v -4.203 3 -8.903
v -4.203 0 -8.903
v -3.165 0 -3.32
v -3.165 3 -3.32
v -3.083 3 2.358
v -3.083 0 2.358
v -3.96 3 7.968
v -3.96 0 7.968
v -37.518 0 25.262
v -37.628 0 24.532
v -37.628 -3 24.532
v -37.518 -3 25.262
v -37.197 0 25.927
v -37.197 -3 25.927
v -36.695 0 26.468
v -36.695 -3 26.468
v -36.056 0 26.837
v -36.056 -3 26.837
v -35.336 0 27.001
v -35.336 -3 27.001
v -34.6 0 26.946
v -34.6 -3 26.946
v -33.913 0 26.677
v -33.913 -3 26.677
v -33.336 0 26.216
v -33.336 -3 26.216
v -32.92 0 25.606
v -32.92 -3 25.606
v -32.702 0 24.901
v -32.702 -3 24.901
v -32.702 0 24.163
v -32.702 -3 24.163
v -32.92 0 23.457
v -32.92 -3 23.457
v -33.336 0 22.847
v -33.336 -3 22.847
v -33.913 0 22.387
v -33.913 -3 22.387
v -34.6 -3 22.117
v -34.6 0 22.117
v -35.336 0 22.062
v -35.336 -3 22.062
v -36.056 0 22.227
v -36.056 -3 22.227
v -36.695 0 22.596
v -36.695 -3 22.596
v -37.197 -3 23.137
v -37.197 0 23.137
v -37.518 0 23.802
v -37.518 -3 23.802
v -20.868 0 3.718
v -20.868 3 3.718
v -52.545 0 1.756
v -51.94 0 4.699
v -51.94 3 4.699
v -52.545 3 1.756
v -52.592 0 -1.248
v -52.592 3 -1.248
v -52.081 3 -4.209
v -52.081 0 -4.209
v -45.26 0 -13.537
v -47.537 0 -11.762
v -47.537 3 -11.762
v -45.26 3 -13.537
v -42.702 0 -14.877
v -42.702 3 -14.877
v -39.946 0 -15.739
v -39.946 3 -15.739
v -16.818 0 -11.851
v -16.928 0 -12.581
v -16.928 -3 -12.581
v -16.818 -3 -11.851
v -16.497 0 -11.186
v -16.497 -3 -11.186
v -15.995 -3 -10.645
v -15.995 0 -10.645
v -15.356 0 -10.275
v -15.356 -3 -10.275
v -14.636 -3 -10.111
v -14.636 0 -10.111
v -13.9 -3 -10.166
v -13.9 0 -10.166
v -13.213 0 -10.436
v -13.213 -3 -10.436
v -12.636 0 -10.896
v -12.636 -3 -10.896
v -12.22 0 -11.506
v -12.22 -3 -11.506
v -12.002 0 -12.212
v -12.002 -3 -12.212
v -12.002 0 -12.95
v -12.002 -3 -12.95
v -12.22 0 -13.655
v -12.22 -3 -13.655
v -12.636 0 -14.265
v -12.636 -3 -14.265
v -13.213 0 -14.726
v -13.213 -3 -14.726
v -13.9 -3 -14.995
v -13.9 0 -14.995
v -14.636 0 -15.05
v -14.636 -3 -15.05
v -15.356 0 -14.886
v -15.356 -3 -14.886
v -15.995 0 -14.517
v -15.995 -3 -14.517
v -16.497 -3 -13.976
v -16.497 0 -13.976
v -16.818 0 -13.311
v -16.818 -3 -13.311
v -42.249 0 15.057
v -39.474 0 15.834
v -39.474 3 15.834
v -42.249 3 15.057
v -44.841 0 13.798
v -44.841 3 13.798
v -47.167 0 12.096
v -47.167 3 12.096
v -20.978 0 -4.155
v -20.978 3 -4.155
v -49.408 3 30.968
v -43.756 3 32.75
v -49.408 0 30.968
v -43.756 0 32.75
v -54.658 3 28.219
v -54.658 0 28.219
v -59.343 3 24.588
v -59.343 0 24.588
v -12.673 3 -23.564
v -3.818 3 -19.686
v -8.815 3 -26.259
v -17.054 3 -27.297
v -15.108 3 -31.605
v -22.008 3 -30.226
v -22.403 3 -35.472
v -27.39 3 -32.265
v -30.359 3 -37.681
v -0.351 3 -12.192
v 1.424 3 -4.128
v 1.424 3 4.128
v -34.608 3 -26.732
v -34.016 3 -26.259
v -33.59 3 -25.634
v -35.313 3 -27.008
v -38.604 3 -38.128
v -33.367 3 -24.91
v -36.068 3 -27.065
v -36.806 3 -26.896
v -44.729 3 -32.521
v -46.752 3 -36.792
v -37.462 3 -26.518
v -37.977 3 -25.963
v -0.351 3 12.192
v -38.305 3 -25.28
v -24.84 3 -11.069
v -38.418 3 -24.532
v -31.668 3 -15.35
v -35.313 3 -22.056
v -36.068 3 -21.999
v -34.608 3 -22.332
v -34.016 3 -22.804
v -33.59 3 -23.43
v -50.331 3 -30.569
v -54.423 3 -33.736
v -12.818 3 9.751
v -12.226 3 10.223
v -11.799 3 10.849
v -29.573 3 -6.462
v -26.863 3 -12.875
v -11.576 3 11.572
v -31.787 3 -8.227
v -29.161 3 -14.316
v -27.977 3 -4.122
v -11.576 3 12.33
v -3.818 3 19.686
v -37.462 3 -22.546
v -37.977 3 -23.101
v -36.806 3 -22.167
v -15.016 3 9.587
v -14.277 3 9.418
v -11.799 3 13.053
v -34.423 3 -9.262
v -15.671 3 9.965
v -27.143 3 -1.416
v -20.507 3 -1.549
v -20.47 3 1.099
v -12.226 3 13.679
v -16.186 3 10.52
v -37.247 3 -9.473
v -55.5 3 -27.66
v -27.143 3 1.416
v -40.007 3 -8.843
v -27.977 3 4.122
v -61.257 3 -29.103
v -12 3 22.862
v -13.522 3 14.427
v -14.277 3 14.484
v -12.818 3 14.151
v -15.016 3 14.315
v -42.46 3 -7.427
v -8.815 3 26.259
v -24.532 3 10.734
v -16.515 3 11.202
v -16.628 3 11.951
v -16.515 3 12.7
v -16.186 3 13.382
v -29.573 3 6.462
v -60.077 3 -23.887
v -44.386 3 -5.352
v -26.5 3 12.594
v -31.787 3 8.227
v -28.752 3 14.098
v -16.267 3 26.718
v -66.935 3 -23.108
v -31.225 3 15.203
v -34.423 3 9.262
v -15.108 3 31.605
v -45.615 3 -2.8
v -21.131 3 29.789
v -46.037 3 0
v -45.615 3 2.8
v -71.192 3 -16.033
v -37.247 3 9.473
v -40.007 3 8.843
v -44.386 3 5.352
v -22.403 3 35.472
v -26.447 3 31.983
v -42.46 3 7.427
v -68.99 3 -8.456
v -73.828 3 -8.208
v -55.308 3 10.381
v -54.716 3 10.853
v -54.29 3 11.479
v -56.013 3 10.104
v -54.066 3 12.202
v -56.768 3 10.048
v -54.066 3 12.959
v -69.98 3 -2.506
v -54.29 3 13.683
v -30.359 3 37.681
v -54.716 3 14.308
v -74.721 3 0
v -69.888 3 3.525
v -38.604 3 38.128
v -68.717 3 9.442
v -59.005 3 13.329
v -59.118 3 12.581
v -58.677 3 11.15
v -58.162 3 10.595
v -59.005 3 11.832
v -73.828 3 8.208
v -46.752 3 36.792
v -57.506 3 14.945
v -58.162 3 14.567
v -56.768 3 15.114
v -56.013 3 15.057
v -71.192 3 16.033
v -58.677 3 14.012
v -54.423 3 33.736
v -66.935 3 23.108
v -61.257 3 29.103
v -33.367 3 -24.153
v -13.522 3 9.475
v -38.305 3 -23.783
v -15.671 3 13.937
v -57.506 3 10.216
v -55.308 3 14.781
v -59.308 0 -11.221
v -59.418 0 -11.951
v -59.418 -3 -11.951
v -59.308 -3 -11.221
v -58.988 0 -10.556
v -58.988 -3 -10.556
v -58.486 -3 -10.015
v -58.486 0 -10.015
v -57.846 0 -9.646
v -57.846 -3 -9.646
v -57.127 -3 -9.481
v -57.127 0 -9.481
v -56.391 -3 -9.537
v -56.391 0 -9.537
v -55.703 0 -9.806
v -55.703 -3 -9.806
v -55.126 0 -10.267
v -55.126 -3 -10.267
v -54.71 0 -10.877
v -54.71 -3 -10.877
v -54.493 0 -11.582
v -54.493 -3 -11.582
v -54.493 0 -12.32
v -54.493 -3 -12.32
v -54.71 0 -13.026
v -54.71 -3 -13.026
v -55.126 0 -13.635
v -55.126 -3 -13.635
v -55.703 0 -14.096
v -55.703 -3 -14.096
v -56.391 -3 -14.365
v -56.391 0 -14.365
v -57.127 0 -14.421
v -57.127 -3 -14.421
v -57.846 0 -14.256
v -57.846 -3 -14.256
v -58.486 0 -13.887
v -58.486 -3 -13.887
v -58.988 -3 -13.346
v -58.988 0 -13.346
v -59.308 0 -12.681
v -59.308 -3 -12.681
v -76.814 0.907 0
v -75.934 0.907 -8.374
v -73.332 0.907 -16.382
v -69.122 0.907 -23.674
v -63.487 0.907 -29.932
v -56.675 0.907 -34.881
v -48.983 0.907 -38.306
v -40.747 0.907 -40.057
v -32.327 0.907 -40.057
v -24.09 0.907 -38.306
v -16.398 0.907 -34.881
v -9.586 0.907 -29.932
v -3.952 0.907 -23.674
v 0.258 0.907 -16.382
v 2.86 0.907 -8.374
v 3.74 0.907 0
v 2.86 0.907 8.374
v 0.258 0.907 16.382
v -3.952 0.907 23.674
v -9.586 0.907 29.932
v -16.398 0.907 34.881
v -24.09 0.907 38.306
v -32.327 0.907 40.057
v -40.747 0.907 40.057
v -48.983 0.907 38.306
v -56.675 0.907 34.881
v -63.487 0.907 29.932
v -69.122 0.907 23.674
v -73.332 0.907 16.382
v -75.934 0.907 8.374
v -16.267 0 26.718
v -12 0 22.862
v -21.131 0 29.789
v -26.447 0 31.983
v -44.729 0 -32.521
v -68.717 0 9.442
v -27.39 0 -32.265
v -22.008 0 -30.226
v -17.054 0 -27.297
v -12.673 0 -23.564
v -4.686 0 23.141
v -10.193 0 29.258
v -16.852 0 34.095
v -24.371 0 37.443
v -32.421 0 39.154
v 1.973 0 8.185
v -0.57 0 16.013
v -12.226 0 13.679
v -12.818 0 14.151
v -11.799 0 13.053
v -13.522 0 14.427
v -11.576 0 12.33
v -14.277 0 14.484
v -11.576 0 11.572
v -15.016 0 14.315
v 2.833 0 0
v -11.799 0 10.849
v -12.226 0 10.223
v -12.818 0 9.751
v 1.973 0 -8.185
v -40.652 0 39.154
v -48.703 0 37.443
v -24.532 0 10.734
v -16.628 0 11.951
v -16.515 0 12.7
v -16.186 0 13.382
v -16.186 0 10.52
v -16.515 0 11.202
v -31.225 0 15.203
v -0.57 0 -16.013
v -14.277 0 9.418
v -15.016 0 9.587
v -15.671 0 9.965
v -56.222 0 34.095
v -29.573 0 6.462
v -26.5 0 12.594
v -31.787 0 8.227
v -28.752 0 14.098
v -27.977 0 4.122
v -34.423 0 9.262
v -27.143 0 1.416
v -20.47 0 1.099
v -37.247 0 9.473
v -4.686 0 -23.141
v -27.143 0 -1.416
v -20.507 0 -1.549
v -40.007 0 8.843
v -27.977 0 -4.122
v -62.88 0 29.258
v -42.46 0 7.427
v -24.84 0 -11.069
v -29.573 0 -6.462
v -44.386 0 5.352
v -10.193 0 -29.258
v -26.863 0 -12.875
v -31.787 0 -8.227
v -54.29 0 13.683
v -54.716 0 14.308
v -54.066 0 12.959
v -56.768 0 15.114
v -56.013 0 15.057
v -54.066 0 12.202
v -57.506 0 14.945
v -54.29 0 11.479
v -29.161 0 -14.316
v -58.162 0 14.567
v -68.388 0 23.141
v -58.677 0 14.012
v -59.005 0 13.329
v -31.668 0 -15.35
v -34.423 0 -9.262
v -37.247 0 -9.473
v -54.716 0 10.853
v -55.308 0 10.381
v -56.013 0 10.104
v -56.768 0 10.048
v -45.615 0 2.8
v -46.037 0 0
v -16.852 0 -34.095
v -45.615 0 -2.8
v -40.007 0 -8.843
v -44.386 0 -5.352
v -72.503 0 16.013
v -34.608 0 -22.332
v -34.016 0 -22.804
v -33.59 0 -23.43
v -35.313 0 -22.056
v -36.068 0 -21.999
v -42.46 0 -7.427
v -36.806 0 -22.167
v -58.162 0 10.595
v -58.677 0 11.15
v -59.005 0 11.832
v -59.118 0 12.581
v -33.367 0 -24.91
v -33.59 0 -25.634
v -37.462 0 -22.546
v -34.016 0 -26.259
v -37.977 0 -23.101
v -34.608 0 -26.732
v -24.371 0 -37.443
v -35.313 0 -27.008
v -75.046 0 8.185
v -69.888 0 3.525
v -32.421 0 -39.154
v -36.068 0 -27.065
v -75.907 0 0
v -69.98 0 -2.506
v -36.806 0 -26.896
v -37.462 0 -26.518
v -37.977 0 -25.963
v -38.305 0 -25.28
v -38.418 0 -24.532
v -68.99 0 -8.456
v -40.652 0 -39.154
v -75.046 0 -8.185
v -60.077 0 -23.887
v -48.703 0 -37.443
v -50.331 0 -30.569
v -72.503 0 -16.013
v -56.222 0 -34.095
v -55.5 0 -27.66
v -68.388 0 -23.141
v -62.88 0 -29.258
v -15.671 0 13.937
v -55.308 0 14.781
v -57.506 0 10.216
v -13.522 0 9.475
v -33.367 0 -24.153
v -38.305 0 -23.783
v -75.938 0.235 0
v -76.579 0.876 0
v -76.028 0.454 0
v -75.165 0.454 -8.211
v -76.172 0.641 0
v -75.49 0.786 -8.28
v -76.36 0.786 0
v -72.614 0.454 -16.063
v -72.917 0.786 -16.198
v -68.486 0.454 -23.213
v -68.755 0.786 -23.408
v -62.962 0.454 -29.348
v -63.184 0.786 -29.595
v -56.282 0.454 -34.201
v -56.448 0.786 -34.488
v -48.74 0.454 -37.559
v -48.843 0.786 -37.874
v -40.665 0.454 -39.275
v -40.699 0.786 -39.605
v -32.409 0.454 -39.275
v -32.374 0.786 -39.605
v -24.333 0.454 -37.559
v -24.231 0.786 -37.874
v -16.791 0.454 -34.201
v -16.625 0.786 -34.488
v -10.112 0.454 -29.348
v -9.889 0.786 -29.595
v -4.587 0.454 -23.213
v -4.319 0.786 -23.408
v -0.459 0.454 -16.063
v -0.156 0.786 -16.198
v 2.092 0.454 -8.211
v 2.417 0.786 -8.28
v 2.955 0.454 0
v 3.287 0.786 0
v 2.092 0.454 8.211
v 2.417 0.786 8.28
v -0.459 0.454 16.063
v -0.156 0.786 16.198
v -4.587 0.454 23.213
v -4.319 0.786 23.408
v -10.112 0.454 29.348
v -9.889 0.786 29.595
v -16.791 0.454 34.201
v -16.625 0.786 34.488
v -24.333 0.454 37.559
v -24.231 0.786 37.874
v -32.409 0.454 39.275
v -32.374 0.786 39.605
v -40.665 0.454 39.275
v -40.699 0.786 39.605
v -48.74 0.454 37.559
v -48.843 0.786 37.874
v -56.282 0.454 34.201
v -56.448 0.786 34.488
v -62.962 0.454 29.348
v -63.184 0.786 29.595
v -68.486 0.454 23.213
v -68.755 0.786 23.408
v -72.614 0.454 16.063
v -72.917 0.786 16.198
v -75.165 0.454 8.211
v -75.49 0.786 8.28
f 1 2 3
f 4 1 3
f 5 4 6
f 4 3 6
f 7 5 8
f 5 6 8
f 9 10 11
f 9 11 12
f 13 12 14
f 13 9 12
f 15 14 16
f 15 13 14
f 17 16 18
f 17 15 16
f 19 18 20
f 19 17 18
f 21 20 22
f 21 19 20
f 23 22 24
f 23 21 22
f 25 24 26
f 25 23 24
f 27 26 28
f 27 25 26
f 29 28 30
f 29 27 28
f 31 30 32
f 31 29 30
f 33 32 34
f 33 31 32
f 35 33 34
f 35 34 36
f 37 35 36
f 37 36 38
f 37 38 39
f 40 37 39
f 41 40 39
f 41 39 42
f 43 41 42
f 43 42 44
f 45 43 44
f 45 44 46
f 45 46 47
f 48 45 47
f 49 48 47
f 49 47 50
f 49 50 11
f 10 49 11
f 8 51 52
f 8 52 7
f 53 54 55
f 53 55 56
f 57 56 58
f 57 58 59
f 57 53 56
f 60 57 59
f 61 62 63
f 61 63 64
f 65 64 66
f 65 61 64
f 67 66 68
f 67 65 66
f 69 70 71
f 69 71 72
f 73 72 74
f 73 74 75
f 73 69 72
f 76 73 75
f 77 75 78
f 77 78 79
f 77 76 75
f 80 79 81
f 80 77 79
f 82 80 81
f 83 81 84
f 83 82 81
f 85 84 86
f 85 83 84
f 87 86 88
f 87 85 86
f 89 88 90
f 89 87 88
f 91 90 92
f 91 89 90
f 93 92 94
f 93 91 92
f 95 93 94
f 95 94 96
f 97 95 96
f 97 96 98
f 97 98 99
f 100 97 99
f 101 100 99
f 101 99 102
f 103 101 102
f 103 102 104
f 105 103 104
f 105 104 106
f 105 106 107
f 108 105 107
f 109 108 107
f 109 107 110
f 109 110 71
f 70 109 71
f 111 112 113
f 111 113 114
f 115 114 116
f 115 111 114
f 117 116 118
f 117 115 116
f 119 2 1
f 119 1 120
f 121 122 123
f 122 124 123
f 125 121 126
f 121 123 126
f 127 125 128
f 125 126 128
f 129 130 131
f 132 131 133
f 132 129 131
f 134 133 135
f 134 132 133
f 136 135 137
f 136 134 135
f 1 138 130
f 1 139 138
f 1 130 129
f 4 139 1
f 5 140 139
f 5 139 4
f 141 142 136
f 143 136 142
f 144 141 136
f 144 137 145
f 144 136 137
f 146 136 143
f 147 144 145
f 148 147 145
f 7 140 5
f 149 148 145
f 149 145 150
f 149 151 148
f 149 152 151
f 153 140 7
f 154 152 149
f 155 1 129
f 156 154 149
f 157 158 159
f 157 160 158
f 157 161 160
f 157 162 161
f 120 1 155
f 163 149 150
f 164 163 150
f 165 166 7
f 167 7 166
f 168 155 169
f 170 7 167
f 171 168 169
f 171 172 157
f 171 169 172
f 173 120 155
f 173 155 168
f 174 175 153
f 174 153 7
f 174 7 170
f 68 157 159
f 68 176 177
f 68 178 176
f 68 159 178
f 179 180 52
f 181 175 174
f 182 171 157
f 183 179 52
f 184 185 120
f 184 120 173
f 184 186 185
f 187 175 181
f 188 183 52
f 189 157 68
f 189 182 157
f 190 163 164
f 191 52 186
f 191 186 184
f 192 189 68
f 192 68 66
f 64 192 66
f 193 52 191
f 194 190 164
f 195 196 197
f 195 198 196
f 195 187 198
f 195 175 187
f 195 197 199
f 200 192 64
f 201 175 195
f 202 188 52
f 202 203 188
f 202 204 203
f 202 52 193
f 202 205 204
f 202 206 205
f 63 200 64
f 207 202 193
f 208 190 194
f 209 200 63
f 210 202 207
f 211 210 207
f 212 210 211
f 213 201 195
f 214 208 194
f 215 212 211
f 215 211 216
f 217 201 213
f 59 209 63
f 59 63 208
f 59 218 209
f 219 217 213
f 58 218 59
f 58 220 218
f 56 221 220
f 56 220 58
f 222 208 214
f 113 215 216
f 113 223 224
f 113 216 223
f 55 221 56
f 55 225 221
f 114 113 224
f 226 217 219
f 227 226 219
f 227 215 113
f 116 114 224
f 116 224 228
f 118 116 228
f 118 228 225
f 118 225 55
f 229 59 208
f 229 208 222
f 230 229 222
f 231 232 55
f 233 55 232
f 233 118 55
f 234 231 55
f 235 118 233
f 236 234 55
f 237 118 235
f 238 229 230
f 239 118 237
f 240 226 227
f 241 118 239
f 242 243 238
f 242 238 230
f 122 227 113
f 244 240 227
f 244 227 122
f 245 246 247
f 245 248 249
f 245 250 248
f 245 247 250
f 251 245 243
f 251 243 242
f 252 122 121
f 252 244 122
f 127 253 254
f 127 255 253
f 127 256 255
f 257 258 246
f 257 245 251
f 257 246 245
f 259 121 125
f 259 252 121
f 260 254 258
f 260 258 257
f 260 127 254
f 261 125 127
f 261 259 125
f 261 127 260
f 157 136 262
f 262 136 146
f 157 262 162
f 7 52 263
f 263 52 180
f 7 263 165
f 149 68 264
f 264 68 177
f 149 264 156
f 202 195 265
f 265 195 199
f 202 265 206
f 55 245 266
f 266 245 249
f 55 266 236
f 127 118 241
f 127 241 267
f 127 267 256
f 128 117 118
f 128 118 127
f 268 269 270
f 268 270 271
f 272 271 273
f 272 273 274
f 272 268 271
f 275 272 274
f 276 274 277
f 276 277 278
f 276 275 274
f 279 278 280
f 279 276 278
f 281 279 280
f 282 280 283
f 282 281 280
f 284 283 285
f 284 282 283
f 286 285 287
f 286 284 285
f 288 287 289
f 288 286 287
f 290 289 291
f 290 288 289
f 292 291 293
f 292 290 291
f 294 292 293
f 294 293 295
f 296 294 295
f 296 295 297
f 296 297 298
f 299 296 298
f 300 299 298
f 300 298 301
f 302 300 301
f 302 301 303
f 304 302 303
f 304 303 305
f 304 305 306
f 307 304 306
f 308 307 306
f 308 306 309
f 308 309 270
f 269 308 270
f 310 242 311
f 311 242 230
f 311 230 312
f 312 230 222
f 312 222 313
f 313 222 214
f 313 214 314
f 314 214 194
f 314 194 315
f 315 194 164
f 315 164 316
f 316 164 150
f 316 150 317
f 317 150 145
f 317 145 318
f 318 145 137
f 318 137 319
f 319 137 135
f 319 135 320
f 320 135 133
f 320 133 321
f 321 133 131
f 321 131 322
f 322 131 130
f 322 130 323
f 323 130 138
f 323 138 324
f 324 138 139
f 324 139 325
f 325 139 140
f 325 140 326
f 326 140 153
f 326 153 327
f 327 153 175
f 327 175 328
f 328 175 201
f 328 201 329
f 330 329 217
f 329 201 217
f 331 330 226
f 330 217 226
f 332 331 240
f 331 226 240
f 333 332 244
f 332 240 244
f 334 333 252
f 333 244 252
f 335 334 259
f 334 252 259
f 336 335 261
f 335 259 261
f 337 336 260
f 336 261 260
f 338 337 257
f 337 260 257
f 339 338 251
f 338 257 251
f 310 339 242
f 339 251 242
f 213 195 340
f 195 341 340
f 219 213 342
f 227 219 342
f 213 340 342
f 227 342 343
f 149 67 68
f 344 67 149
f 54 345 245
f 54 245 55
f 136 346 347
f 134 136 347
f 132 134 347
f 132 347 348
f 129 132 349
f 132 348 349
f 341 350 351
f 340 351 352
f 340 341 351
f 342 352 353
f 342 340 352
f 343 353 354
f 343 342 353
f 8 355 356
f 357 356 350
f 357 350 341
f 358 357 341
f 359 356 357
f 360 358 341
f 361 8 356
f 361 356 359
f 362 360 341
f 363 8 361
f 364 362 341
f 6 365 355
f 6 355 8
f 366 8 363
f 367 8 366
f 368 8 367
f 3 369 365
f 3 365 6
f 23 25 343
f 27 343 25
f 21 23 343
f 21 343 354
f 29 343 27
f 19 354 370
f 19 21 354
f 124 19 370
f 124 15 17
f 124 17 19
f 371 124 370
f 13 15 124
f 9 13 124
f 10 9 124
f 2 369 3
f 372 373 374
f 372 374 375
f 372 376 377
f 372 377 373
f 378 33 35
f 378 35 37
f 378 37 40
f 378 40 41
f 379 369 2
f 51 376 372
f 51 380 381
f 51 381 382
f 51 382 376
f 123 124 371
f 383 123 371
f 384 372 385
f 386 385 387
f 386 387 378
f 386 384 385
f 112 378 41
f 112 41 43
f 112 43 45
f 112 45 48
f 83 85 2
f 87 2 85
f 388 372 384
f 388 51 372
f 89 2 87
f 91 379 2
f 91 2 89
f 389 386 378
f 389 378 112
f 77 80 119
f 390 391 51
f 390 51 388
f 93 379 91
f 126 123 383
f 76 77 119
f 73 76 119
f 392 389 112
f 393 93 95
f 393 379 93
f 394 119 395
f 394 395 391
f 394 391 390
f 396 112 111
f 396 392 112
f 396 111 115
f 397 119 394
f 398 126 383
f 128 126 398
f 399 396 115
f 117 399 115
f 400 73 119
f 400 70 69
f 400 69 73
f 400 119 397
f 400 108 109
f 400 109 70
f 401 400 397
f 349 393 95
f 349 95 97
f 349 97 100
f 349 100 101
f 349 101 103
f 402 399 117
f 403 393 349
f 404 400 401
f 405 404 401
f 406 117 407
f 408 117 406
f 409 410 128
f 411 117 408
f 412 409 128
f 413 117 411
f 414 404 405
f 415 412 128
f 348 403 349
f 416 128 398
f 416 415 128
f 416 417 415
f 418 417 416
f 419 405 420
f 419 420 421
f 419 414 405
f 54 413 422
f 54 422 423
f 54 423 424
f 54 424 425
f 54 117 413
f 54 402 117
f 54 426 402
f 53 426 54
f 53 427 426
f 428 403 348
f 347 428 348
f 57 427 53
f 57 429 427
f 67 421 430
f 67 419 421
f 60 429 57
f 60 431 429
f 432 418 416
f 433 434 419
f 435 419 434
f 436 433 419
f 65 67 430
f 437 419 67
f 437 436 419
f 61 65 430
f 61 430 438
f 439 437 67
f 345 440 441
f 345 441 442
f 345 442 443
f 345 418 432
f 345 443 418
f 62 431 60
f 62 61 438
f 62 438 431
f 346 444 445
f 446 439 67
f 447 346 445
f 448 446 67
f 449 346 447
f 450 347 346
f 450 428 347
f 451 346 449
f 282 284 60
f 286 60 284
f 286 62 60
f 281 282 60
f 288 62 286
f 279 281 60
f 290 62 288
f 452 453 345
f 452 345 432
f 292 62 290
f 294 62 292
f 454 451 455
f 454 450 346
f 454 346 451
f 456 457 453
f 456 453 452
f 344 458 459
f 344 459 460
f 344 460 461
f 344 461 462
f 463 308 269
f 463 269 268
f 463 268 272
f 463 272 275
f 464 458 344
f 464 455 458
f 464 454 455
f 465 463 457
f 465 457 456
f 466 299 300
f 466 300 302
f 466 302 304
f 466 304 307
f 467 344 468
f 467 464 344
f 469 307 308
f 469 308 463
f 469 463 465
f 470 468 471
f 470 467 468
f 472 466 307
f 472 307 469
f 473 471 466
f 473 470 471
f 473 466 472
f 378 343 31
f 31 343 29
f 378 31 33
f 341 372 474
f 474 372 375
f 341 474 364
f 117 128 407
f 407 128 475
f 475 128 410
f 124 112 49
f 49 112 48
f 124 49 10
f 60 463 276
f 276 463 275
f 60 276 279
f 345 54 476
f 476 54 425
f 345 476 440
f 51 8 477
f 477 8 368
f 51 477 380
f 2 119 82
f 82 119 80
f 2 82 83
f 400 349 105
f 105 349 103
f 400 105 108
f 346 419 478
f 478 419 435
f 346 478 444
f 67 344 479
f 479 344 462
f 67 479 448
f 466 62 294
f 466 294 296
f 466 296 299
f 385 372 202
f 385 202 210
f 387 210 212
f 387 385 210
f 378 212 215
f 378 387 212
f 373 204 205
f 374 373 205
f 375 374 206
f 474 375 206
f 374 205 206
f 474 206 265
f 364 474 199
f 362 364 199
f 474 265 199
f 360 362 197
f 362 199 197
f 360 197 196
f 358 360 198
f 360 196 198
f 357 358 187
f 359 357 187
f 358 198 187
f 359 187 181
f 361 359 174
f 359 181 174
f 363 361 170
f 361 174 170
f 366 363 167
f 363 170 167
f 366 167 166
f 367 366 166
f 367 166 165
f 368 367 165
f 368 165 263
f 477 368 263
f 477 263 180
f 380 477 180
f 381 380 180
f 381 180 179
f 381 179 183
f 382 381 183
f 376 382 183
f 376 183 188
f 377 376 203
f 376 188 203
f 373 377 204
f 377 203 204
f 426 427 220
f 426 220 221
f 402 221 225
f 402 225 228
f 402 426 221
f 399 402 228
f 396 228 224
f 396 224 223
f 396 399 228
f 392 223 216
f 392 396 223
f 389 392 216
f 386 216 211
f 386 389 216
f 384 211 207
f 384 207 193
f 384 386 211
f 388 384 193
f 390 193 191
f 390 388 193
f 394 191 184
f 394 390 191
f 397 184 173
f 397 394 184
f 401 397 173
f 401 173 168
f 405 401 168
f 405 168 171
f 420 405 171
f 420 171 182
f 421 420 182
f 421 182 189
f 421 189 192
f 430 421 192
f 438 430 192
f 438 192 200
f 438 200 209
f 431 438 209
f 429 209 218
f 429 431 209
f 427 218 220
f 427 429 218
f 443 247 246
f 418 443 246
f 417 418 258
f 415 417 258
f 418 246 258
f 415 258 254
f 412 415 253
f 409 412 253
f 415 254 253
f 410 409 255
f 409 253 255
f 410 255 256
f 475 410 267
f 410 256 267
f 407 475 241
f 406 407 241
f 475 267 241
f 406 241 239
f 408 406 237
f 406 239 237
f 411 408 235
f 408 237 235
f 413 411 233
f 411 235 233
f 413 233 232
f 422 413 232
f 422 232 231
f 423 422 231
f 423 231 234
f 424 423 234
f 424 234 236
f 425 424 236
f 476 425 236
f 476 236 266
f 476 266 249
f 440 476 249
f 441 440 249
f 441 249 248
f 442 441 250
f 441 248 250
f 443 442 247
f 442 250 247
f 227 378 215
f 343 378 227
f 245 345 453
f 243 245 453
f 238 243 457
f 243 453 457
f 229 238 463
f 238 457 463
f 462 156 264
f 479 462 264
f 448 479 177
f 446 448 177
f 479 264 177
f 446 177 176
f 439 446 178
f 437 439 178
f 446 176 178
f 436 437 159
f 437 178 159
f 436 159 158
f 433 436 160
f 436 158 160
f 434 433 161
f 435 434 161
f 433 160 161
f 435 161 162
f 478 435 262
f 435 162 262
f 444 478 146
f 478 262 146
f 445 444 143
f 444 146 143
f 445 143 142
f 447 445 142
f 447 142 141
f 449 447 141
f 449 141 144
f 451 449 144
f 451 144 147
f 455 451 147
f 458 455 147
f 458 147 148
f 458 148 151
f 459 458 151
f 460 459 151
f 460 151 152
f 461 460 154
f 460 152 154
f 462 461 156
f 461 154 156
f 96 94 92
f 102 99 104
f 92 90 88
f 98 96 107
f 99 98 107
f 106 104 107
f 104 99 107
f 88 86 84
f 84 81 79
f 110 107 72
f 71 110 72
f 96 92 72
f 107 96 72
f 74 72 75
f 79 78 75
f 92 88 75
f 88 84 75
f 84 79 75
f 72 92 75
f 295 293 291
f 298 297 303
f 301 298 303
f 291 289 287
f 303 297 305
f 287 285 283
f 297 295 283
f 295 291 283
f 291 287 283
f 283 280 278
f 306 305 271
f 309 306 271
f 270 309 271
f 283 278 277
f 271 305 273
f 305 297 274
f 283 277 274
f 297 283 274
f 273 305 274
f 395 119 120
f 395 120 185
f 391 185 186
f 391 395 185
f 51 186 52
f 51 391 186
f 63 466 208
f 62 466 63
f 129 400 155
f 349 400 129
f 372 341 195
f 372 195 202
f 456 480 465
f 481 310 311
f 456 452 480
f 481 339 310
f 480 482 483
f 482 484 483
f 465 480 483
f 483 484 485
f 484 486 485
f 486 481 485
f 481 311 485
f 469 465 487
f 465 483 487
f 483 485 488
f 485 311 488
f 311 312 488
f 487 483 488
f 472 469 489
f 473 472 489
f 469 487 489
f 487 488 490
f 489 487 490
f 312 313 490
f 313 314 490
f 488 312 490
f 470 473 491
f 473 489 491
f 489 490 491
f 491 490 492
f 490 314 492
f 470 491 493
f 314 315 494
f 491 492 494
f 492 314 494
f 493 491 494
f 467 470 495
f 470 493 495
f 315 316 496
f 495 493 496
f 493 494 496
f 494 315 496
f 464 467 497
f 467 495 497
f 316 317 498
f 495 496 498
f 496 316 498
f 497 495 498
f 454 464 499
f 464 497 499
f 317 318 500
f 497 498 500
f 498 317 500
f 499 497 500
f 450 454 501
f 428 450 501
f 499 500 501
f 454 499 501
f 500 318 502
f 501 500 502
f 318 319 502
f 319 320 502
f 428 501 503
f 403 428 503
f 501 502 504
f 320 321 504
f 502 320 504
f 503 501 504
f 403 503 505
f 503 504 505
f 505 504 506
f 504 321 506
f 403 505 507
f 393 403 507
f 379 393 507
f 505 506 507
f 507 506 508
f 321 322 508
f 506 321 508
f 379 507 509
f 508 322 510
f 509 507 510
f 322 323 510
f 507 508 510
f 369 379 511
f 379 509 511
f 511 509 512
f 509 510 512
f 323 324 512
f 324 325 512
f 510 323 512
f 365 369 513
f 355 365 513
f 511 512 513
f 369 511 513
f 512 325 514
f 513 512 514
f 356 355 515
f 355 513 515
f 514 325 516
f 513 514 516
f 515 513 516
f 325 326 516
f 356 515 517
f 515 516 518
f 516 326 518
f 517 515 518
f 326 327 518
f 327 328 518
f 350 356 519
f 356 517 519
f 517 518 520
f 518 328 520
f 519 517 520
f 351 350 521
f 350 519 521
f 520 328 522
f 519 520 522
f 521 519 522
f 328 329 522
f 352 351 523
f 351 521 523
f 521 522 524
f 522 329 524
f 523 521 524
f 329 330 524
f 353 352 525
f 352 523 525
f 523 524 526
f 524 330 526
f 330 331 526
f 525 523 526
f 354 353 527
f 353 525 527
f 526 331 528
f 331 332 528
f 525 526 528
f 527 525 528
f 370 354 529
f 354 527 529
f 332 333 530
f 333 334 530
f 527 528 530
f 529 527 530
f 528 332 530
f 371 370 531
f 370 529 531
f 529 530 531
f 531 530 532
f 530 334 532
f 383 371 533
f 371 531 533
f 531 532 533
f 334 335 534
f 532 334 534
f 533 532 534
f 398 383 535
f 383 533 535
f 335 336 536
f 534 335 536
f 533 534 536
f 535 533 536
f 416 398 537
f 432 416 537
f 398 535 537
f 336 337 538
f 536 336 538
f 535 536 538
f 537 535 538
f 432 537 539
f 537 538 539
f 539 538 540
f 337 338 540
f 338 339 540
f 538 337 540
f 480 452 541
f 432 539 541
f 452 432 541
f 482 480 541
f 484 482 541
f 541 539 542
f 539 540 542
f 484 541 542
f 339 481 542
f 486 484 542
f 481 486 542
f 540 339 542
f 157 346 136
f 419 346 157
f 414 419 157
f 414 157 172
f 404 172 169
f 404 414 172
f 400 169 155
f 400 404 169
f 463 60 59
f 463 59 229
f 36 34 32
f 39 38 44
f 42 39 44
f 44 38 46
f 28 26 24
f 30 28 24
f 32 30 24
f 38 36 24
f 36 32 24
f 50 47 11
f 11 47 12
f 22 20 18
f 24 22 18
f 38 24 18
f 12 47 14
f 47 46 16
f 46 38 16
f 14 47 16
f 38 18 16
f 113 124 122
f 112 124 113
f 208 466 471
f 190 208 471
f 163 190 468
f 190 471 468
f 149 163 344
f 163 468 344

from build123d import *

# Parameters (mm, degrees)
SKETCH2_R           = 9.5
BOSS_EXTRUDE1_DEPTH = 3
SKETCH3_R           = 2.4765
BOSS_EXTRUDE2_DEPTH = 6
SKETCH5_R           = 2.54
CUT_EXTRUDE1_DEPTH  = 3


with BuildPart() as part:
    # Sketch1 → Revolve1 (revolve)
    with BuildSketch(Plane.XY, mode=Mode.PRIVATE) as revolve1_sk:
        with BuildLine():
            Line((-3, 3), (-3, 0))
            Line((-3, 0), (2.833330973, 0))
            ThreePointArc((2.833330973, 0), (3.099026965, 0.641446866), (3.74047383, 0.907142857))
            Line((3.74047383, 0.907142857), (1.647616688, 3))
            Line((1.647616688, 3), (-3, 3))
        make_face()
    revolve(revolve1_sk.sketch.rotate(Axis((-36.536669027, 18.916479231, 0), (0, -1, 0)), 180), axis=Axis((-36.536669027, 18.916479231, 0), (0, -1, 0)))

    # Sketch2 → Boss-Extrude1 (add)
    with BuildSketch(Plane(origin=(0, 0, 0), x_dir=(1, 0, 0), z_dir=(0, 1, 0))):
        with BuildLine():
            Line((-20.867712208, -3.717876844), (-3.835179752, -7.99934189))
            ThreePointArc((-3.835179752, -7.99934189), (-6.912459925, -15.993220643), (-11.907531207, -22.951741583))
            Line((-11.907531207, -22.951741583), (-24.531535953, -10.733852798))
            ThreePointArc((-24.531535953, -10.733852798), (-27.594601894, -13.393216618), (-31.225026168, -15.202804549))
            Line((-31.225026168, -15.202804549), (-26.411510933, -32.106978136))
            ThreePointArc((-26.411510933, -32.106978136), (-35.048905375, -33.632773165), (-43.787287916, -32.875604894))
            Line((-43.787287916, -32.875604894), (-39.473539012, -15.833938572))
            ThreePointArc((-39.473539012, -15.833938572), (-43.573178883, -14.485383842), (-47.167458429, -12.096492578))
            Line((-47.167458429, -12.096492578), (-59.432790875, -24.680852412))
            ThreePointArc((-59.432790875, -24.680852412), (-65.164474953, -17.715123462), (-68.840755241, -9.47749362))
            Line((-68.840755241, -9.47749362), (-51.939863017, -4.698981901))
            ThreePointArc((-51.939863017, -4.698981901), (-52.638650424, -0.254972715), (-52.080918658, 4.208933284))
            Line((-52.080918658, 4.208933284), (-69.114911822, 8.487341623))
            ThreePointArc((-69.114911822, 8.487341623), (-65.689685641, 16.836819584), (-60.169485242, 23.976381487))
            Line((-60.169485242, 23.976381487), (-47.536935944, 11.761502615))
            ThreePointArc((-47.536935944, 11.761502615), (-44.010986284, 14.264410171), (-39.946180469, 15.738934136))
            Line((-39.946180469, 15.738934136), (-44.764676694, 32.64470495))
            ThreePointArc((-44.764676694, 32.64470495), (-36.044934422, 33.662071661), (-27.358629805, 32.390437902))
            Line((-27.358629805, 32.390437902), (-31.667700916, 15.350308321))
            ThreePointArc((-31.667700916, 15.350308321), (-27.981833761, 13.643812135), (-24.840179389, 11.069369727))
            Line((-24.840179389, 11.069369727), (-12.58348556, 23.656328398))
            ThreePointArc((-12.58348556, 23.656328398), (-7.387085692, 16.842762923), (-4.079178242, 8.938017868))
            Line((-4.079178242, 8.938017868), (-20.977889223, 4.154899158))
            ThreePointArc((-20.977889223, 4.154899158), (-20.434245789, 0.225348329), (-20.867712208, -3.717876844))
        make_face()
        with Locations(Location((-36.536669027, 0, 0), (0, 0, 180))):
            Circle(SKETCH2_R, mode=Mode.SUBTRACT)
    extrude(amount=BOSS_EXTRUDE1_DEPTH)

    # Sketch3 → Boss-Extrude2 (add)
    with BuildSketch(Plane(origin=(0, 3, 0), x_dir=(1, 0, 0), z_dir=(0, 1, 0))):
        with Locations(Location((-35.151038514, -24.531821511, 0), (0, 0, 180))):
            Circle(SKETCH3_R)
        with Locations(Location((-56.941625658, 11.951020157, 0), (0, 0, 180))):
            Circle(SKETCH3_R)
        with Locations(Location((-14.451264399, 12.580801354, 0), (0, 0, 180))):
            Circle(SKETCH3_R)
    extrude(amount=-BOSS_EXTRUDE2_DEPTH)

    # Sketch5 → Cut-Extrude1 (cut)
    with BuildSketch(Plane(origin=(0, 3, 0), x_dir=(1, 0, 0), z_dir=(0, 1, 0))):
        with Locations(Location((-35.8782472, 24.531821511, 0), (0, 0, 180))):
            Circle(SKETCH5_R)
        with Locations(Location((-14.087660056, -11.951020157, 0), (0, 0, 180))):
            Circle(SKETCH5_R)
        with Locations(Location((-56.578021315, -12.580801354, 0), (0, 0, 180))):
            Circle(SKETCH5_R)
    extrude(amount=-CUT_EXTRUDE1_DEPTH, mode=Mode.SUBTRACT)


solid = part.part
